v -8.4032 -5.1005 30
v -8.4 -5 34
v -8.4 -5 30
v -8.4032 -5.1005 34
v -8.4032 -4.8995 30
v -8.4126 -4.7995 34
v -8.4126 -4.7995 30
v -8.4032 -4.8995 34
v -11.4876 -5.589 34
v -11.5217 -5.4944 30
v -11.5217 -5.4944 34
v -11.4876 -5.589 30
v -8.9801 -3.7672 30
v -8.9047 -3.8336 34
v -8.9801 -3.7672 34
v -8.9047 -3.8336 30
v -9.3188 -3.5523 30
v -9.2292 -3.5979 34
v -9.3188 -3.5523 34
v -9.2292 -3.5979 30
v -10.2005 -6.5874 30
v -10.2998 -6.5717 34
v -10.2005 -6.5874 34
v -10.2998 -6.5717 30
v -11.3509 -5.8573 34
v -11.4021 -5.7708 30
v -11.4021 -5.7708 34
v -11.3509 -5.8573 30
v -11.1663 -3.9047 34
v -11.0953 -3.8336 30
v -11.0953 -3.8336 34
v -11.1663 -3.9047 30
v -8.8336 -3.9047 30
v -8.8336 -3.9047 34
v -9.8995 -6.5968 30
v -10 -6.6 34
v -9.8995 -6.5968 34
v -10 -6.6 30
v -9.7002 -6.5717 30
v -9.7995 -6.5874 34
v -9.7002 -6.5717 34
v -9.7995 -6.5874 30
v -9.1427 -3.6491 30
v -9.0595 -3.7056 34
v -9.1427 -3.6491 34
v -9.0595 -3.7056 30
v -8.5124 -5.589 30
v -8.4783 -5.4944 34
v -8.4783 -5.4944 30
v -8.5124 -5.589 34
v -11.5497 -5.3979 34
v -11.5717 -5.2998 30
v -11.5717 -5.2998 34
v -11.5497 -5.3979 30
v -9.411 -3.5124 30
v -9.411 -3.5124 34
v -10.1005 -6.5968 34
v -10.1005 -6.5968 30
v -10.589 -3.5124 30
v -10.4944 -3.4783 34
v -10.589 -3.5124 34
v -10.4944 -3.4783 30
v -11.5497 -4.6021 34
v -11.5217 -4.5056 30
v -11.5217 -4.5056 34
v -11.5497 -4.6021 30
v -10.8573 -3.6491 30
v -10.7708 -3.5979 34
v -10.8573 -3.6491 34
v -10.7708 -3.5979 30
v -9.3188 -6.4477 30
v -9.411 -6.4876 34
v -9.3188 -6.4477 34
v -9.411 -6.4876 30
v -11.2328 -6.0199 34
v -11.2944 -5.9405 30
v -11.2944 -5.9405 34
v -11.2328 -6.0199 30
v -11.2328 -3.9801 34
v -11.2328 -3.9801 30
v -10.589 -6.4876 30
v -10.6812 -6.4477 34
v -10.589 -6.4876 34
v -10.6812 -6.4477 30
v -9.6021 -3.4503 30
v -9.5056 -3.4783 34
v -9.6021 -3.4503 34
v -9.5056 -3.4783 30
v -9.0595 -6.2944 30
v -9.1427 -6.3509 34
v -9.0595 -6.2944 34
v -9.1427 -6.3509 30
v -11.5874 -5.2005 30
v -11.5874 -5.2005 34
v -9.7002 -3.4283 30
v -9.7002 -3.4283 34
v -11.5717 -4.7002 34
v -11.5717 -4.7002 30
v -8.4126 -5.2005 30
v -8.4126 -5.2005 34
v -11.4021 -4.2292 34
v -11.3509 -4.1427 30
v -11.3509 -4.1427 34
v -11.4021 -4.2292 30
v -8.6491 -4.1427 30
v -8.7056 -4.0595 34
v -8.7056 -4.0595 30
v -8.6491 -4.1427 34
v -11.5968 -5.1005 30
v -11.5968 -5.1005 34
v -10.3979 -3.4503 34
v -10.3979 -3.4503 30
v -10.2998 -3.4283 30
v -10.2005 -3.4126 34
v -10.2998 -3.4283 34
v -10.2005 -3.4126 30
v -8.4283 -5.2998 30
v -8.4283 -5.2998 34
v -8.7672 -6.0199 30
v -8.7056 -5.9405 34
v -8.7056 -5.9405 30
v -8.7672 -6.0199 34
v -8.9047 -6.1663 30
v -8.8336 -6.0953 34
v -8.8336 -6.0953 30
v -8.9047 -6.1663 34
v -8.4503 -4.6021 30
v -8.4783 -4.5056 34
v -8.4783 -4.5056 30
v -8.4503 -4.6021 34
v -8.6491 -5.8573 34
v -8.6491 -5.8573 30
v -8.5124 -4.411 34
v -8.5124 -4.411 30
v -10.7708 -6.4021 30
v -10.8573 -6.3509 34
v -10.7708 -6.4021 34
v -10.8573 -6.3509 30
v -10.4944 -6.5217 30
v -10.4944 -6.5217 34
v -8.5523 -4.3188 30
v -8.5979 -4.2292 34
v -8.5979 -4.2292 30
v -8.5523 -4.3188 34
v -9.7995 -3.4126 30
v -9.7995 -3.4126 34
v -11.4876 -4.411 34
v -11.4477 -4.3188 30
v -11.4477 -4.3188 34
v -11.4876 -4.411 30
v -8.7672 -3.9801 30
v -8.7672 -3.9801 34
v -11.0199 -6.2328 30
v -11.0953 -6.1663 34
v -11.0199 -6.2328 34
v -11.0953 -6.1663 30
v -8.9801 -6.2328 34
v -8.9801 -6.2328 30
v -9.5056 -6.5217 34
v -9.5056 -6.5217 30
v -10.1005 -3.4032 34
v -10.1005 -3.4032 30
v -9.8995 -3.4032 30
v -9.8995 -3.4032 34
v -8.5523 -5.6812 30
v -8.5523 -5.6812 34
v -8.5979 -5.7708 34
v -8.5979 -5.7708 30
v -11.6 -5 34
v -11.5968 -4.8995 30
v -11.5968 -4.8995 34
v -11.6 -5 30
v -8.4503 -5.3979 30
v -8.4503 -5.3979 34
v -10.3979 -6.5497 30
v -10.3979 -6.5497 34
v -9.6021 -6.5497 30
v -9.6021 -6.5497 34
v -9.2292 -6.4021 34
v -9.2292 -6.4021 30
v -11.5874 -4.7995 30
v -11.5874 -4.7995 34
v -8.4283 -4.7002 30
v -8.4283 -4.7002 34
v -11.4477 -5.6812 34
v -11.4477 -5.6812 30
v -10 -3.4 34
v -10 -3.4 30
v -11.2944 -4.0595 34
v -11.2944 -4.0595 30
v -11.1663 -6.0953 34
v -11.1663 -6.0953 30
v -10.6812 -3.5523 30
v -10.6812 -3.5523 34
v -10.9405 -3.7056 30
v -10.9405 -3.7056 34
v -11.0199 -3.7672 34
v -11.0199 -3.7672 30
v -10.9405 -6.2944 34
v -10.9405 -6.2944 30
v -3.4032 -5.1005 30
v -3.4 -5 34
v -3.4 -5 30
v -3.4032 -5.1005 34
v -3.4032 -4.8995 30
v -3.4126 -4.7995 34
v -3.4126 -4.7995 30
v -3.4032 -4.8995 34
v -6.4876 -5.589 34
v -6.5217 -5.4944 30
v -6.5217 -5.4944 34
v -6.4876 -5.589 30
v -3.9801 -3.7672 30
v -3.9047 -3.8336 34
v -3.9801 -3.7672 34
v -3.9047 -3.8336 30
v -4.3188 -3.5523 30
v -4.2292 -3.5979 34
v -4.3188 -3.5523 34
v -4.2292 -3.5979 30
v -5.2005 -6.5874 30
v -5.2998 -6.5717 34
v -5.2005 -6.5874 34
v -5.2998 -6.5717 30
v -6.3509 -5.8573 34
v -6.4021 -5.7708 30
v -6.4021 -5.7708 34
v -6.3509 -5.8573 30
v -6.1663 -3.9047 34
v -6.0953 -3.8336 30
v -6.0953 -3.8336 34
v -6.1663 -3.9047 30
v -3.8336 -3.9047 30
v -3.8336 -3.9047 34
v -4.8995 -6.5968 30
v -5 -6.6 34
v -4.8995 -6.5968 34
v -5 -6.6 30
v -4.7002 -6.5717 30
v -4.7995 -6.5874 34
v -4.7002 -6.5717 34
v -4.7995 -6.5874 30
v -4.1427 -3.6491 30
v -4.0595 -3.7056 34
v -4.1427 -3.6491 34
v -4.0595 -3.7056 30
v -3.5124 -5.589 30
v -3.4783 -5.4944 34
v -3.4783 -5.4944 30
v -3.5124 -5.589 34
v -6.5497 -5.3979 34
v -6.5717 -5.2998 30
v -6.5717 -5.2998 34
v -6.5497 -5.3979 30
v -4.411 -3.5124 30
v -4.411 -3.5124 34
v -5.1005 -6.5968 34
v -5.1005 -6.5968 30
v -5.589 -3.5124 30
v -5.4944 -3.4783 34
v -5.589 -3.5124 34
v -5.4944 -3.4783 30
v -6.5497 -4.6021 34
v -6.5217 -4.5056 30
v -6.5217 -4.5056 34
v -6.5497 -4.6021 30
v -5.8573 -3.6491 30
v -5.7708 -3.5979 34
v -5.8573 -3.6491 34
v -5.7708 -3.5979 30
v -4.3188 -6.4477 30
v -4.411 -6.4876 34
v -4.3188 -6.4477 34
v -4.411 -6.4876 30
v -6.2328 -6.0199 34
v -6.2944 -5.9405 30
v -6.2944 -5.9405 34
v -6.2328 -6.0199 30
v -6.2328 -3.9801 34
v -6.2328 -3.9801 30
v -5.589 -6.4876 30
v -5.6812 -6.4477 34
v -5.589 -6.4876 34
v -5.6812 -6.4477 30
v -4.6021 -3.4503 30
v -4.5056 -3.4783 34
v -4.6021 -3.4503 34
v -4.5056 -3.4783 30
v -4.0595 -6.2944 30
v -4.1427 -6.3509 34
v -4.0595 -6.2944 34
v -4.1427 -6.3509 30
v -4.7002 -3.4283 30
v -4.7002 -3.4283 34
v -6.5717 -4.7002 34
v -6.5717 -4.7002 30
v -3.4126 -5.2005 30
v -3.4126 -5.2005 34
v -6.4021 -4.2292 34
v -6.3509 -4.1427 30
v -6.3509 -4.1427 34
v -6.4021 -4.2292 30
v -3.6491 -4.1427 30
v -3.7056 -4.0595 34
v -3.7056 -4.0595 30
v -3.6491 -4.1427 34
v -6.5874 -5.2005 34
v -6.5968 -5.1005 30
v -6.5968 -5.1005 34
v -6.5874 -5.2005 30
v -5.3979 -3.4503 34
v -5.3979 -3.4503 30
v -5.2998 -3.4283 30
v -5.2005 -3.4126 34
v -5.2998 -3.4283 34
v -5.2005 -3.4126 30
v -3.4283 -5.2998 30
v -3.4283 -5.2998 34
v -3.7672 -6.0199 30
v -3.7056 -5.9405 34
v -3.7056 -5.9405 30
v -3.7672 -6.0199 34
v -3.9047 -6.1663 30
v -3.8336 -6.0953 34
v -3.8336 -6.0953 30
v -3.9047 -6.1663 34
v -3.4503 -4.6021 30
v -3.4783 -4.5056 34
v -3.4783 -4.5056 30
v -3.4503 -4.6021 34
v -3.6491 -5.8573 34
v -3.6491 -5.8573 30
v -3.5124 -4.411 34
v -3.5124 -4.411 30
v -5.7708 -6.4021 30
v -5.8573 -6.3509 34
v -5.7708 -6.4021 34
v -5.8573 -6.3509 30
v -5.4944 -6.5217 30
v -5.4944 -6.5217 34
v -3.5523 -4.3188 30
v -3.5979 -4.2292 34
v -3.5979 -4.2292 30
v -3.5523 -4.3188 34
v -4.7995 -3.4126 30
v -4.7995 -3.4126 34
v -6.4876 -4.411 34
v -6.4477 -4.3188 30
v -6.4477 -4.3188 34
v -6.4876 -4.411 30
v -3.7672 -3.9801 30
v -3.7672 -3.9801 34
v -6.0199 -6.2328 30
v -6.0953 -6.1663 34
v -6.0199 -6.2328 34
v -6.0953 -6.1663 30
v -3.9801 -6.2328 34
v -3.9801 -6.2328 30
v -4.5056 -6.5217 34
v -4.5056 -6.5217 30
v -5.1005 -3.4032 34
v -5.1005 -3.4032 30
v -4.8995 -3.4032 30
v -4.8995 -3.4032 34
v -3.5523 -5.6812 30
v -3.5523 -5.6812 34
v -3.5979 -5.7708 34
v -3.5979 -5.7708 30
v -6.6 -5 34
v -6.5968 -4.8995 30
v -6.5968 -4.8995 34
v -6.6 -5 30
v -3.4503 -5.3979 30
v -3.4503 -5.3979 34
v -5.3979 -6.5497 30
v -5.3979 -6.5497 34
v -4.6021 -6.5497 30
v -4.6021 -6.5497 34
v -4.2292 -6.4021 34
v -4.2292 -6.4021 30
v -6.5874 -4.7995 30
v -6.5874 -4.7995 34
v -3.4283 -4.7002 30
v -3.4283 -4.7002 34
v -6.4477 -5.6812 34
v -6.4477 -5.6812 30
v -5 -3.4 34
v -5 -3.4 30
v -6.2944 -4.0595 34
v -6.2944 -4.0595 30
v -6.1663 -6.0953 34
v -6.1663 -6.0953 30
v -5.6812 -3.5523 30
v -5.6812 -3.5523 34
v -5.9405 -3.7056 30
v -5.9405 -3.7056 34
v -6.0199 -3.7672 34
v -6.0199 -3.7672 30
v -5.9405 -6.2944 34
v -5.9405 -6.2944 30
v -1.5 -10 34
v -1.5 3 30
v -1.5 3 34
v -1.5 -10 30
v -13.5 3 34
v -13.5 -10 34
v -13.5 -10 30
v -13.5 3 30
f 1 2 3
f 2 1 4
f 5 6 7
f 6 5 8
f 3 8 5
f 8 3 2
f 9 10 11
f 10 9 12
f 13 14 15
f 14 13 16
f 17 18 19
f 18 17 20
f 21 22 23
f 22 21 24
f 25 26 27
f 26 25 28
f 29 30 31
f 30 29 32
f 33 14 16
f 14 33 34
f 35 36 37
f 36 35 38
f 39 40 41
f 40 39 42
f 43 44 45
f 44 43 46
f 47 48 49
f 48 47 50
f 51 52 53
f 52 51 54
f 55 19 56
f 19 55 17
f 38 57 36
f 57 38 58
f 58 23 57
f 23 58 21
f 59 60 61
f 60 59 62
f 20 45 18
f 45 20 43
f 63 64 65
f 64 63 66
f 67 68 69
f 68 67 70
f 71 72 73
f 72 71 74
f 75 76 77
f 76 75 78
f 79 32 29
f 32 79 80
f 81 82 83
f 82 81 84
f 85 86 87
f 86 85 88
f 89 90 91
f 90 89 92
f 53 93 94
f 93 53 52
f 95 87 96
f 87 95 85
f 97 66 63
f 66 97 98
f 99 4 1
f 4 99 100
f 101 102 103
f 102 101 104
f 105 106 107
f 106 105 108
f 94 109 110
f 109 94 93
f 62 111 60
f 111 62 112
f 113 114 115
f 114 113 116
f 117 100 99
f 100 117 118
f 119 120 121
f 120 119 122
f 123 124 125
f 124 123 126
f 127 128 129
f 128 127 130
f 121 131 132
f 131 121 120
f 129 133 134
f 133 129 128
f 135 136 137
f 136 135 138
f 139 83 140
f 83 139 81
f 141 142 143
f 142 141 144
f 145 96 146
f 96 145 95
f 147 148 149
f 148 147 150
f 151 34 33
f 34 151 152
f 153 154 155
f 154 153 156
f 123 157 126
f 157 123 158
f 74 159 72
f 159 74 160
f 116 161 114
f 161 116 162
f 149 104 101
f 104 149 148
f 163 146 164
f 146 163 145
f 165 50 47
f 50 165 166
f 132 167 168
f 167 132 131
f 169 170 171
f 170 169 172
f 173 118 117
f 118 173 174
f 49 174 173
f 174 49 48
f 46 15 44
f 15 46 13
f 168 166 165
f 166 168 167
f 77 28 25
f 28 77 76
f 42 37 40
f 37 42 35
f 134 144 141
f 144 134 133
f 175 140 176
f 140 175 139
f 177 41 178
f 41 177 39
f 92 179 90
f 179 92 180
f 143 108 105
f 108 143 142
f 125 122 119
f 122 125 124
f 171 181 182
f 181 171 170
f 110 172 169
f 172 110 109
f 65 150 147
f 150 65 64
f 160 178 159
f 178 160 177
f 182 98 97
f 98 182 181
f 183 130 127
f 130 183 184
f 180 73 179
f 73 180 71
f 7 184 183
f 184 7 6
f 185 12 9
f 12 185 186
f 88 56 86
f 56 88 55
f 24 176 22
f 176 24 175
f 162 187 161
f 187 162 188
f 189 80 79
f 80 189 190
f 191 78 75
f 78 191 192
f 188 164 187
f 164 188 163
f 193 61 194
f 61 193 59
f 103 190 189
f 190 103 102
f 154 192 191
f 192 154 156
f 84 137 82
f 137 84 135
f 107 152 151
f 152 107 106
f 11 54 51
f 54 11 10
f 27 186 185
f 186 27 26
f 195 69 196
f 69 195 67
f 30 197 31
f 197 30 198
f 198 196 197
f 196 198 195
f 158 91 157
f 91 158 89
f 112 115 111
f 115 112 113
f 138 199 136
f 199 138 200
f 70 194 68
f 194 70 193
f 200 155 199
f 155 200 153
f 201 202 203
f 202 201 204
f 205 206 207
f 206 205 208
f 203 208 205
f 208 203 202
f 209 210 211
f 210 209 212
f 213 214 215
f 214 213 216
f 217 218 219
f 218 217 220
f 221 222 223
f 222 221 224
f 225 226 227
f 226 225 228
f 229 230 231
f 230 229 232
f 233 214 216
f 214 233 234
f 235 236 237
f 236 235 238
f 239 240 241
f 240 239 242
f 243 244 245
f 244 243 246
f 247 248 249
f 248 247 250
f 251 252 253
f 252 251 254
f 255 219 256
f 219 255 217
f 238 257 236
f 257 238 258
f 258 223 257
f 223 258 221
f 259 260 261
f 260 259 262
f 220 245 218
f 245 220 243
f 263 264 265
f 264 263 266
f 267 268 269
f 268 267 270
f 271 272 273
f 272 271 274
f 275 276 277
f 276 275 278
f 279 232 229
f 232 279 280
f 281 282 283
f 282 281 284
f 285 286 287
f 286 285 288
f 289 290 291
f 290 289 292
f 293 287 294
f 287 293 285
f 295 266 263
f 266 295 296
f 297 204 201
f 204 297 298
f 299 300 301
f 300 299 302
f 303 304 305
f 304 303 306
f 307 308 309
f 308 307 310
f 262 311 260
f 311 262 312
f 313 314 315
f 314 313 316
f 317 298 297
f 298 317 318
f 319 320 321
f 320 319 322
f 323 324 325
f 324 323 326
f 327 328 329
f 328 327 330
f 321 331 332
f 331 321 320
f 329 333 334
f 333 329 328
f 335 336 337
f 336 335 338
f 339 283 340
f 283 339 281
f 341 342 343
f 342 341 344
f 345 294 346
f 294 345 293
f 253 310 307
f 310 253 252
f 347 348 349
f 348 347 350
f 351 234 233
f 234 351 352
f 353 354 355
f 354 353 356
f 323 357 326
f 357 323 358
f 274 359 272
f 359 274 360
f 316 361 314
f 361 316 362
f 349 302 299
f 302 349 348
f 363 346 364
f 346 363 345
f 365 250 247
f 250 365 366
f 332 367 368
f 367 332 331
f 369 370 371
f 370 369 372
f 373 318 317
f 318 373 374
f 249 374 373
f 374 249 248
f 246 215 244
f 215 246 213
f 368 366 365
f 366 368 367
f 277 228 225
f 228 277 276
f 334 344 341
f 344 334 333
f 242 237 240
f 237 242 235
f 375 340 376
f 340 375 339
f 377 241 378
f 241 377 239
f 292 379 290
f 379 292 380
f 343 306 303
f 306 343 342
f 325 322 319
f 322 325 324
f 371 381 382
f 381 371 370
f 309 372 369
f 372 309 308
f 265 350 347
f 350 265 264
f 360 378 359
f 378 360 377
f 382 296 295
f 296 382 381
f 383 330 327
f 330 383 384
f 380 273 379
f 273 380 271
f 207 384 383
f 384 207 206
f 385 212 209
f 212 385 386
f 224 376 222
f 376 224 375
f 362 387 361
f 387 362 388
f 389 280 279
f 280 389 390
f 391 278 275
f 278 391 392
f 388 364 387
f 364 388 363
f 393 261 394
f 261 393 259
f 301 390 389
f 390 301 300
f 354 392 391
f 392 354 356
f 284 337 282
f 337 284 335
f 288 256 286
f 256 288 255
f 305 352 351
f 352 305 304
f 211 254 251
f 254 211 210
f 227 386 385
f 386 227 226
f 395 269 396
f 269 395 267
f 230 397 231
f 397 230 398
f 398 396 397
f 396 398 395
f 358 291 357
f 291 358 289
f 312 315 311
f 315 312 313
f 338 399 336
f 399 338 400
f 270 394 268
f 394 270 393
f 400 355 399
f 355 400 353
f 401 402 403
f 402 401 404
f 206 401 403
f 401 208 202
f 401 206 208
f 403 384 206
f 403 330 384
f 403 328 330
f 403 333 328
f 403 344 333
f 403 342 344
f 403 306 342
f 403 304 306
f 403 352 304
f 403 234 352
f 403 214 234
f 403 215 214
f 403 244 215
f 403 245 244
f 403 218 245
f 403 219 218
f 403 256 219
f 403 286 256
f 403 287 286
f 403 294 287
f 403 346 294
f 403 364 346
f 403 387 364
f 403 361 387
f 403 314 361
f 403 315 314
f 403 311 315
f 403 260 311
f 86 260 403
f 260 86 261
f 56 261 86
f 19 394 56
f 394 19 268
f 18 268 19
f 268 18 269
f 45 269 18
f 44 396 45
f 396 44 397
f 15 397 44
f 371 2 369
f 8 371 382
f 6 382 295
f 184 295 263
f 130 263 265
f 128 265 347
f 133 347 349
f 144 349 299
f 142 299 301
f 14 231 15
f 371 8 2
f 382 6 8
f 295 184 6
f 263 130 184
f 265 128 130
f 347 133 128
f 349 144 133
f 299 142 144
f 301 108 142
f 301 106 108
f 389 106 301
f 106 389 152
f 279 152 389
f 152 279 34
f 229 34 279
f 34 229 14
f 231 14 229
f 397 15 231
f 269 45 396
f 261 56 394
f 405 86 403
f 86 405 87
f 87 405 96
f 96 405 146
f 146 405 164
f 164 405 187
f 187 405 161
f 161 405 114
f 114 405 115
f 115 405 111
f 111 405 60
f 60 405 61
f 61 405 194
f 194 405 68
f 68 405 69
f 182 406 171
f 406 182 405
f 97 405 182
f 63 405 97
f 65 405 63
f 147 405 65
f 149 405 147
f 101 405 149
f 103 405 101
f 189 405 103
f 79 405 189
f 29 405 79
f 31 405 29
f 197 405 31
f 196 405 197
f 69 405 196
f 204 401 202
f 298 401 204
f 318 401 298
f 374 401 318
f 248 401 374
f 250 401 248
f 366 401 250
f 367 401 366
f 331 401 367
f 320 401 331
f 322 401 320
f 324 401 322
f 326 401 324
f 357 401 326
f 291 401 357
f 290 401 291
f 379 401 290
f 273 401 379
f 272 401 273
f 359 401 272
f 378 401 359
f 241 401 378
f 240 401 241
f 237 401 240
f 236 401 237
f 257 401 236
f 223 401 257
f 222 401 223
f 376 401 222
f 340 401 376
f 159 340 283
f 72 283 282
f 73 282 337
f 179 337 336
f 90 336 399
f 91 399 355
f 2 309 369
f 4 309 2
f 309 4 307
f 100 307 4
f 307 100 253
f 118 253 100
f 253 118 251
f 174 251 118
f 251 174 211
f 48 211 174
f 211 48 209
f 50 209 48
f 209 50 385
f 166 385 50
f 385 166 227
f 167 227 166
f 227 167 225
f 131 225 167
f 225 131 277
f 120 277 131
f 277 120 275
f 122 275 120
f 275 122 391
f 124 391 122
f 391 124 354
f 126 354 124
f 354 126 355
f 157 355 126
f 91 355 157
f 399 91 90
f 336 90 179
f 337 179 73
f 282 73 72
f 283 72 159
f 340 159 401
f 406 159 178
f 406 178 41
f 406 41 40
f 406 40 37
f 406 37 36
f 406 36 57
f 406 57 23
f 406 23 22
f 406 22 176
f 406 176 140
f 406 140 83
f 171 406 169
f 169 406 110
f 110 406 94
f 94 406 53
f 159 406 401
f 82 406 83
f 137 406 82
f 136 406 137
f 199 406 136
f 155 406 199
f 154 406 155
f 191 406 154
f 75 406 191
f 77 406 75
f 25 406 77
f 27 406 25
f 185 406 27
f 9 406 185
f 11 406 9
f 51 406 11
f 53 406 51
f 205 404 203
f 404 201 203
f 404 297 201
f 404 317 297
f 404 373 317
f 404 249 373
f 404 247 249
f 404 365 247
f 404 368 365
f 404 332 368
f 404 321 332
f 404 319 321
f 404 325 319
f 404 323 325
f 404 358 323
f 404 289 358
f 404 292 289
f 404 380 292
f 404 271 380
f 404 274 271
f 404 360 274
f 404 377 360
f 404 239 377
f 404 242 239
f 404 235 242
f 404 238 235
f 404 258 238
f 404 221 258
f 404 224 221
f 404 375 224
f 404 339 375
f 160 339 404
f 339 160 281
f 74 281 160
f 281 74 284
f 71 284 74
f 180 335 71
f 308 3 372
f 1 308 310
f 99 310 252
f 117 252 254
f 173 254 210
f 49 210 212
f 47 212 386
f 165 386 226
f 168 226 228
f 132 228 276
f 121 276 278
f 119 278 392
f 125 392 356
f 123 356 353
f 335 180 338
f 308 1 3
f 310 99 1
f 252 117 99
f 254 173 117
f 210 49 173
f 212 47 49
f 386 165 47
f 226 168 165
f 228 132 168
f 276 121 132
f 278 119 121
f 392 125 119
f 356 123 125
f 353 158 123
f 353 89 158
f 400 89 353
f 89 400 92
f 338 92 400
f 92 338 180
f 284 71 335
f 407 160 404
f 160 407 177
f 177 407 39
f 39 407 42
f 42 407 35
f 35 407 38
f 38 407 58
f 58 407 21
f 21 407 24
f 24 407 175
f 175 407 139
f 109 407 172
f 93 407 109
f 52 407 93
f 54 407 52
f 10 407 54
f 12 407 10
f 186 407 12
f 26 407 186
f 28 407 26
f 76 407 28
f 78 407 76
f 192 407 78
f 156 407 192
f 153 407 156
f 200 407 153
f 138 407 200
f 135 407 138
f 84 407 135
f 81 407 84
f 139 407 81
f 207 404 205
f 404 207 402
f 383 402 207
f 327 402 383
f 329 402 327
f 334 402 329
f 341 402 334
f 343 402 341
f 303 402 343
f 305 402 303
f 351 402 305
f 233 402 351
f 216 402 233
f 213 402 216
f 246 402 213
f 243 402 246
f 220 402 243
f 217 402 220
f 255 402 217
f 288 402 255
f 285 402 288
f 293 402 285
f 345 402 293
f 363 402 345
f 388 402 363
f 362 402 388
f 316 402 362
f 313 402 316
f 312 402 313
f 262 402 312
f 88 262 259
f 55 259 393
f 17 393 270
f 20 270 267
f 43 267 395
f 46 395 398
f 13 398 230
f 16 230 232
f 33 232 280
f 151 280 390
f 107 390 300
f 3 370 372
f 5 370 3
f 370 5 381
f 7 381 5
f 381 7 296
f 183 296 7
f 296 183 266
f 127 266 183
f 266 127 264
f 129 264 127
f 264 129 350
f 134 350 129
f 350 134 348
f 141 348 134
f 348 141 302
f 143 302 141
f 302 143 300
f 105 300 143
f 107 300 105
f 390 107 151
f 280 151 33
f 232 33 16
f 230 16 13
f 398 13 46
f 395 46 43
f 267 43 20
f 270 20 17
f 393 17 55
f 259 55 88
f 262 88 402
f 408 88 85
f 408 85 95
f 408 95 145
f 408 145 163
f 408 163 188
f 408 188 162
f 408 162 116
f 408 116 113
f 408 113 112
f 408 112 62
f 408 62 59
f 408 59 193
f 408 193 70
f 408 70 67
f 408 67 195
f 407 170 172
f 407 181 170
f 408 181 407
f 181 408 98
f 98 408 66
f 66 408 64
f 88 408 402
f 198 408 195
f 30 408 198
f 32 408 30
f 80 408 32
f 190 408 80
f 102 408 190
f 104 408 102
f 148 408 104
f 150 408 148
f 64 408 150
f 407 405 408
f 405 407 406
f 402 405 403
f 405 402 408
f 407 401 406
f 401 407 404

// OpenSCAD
difference(){
	union(){
        
        translate([-13.5,-10,30]){
            cube([
            12,
            21-8,
            ,4], center=false);
        }       

        

	}
	union() {
        // schroefgaten voor ashouder1
        translate([-10,-5,0]){
                cylinder(h=100, r=1.6, $fn=100, center=false);
        }  
        translate([-5,-5,0]){
                cylinder(h=100, r=1.6, $fn=100, center=false);
        }  
	}
}
